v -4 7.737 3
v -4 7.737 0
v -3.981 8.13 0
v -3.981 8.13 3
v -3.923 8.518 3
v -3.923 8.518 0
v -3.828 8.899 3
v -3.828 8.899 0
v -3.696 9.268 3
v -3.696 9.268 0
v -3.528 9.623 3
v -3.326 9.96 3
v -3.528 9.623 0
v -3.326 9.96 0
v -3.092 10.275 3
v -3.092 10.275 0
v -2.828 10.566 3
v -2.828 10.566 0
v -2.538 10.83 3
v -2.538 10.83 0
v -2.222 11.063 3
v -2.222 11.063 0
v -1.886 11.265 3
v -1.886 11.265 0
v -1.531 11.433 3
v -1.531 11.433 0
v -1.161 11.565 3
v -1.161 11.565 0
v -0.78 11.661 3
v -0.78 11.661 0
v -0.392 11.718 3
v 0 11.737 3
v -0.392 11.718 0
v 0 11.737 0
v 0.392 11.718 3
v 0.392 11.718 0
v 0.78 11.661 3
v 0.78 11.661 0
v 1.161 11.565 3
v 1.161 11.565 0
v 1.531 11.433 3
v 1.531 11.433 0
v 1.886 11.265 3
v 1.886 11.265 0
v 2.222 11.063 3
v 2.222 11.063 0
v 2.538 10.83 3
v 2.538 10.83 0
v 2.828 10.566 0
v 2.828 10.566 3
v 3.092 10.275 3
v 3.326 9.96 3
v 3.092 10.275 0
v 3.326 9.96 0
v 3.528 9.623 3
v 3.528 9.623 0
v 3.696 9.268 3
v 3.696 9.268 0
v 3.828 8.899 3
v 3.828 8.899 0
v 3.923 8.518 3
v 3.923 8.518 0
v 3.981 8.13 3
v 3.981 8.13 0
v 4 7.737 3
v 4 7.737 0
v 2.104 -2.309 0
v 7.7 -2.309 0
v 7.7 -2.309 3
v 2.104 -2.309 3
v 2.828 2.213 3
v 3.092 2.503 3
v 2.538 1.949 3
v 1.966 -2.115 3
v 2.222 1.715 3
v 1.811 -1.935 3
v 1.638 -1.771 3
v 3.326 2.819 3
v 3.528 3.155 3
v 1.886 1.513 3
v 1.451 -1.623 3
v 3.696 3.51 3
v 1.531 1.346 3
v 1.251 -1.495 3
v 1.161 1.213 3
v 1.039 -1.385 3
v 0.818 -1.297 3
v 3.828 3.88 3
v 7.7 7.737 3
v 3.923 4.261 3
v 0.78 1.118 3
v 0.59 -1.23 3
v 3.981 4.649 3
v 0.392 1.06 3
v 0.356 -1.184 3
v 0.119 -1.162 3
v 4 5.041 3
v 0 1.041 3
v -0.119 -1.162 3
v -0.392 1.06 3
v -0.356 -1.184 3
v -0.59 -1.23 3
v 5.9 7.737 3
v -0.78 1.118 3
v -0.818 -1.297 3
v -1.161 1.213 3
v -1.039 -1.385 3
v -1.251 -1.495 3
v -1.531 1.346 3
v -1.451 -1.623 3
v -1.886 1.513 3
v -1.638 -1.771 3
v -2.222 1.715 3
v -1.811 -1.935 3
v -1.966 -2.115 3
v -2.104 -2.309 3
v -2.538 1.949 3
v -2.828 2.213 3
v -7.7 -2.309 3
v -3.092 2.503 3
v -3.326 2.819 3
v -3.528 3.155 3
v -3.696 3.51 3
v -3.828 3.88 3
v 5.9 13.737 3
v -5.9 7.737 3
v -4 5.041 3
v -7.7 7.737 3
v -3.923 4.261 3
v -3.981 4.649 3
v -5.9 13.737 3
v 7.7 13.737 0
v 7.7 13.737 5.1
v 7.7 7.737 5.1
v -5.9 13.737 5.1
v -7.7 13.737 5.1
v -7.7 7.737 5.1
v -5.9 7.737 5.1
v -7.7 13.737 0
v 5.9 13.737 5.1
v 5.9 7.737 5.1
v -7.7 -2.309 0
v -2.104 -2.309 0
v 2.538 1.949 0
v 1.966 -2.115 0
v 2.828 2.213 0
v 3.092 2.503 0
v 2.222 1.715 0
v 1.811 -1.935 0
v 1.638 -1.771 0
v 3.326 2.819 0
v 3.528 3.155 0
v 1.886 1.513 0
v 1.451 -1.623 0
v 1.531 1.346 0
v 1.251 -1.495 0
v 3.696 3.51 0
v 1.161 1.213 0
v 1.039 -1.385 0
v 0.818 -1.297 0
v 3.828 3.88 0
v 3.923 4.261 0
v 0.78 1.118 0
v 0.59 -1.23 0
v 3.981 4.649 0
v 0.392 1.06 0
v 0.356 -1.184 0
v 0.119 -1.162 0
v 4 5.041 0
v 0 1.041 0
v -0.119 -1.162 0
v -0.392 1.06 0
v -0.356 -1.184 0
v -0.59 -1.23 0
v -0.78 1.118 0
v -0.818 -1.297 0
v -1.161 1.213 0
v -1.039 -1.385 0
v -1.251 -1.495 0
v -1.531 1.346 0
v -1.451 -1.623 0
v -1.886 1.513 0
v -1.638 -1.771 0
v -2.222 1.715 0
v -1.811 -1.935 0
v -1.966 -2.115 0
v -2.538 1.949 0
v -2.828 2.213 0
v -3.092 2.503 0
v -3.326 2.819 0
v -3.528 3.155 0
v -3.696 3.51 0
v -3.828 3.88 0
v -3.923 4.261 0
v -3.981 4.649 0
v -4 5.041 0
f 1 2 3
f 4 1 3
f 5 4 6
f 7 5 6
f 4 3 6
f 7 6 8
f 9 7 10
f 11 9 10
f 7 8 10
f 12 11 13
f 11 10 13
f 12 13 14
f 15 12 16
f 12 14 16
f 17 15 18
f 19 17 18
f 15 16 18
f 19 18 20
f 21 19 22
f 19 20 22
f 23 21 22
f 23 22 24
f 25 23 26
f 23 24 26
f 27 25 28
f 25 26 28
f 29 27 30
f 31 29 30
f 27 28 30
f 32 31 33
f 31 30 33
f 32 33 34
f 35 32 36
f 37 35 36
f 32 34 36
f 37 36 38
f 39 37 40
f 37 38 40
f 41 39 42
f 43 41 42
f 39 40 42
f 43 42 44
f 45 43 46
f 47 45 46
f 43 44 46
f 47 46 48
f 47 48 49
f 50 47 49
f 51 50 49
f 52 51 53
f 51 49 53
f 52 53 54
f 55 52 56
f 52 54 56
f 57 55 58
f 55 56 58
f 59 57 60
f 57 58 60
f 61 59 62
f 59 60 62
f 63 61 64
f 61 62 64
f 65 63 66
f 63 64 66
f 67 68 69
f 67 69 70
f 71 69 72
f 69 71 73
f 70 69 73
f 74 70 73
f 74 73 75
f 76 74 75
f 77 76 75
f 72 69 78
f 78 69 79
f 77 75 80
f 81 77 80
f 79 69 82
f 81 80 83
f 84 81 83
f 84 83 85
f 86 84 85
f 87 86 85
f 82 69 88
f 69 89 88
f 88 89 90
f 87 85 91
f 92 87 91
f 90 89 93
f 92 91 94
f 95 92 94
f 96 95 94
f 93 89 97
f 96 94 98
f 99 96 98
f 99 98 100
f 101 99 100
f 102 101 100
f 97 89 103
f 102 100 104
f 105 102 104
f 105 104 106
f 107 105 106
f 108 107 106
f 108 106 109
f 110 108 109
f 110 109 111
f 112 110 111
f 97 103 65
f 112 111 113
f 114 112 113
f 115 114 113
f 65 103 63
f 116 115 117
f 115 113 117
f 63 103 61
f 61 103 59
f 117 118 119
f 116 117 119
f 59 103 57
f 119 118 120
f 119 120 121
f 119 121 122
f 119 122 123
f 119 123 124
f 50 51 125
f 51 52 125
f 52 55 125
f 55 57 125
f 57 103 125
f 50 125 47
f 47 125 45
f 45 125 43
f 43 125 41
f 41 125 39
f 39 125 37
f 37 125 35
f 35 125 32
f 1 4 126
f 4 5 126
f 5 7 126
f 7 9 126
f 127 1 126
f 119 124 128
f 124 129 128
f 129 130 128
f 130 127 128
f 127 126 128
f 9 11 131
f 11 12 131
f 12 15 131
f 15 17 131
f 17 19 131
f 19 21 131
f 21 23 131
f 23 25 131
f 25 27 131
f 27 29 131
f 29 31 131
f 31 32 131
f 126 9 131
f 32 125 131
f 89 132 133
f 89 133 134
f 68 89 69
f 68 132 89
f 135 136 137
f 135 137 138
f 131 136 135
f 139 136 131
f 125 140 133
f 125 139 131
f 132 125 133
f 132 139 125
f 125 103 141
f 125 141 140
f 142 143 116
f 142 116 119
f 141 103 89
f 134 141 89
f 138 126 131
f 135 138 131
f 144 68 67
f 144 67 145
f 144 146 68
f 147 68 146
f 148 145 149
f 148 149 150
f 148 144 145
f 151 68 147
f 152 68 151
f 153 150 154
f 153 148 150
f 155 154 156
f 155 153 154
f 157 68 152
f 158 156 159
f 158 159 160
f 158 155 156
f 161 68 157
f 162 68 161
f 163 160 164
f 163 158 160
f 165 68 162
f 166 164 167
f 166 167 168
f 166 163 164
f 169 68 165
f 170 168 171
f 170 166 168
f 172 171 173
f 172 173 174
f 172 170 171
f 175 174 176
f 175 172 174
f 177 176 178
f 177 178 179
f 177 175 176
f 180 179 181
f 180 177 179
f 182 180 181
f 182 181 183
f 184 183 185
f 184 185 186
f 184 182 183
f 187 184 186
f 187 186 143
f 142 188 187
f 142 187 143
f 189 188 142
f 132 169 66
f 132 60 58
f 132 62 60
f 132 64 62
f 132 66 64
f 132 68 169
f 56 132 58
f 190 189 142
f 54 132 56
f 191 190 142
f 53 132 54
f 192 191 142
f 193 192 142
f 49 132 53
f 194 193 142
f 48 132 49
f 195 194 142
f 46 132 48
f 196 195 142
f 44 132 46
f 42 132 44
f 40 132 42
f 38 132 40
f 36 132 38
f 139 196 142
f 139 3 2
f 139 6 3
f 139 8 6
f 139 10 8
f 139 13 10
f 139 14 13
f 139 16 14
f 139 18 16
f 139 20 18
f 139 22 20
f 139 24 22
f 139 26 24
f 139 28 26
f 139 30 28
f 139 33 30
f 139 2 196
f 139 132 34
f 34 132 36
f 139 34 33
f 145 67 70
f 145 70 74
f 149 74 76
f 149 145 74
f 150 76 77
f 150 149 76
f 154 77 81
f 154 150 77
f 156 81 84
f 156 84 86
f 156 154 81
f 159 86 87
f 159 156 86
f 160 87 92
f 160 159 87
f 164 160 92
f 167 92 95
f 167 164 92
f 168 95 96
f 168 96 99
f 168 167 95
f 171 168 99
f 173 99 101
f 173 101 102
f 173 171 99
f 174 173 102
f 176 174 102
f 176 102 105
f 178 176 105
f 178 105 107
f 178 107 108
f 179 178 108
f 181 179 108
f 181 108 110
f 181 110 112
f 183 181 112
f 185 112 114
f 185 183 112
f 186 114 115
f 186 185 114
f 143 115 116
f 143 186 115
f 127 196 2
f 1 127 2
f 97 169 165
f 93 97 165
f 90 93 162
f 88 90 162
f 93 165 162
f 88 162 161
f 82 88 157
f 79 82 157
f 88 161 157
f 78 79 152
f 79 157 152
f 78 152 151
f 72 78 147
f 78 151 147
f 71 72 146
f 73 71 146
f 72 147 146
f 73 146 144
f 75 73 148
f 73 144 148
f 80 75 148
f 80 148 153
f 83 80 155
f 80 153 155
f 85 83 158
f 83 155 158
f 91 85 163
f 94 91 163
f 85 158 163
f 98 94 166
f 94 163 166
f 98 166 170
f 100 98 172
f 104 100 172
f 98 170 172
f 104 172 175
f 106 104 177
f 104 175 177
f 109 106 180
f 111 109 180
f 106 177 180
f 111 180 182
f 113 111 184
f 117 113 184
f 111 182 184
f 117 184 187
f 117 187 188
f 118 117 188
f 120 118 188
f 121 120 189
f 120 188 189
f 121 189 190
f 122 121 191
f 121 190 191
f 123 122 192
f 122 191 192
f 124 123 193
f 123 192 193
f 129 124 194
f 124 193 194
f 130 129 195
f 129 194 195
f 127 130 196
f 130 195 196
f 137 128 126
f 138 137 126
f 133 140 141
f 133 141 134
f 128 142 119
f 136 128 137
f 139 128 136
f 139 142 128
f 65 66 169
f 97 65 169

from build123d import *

# Parameters (mm, degrees)
EXTRUDE_1_DEPTH = 3
SKETCH_2_W      = 1.8
SKETCH_2_H      = 6
EXTRUDE_2_DEPTH = 2.1


with BuildPart() as part:
    # Эскиз1 → Бобышка-Вытянуть1 (new body)
    with BuildSketch(Plane.XY):
        with BuildLine():
            Line((-7.7, 13.737499607), (7.7, 13.737499607))
            Line((7.7, 13.737499607), (7.7, -0.039604792))
            Line((7.7, -0.039604792), (7.7, -2.309398114))
            Line((7.7, -2.309398114), (2.10443313, -2.309398114))
            ThreePointArc((2.10443313, -2.309398114), (0, -1.158976271), (-2.10443313, -2.309398114))
            Line((-2.10443313, -2.309398114), (-7.7, -2.309398114))
            Line((-7.7, -2.309398114), (-7.7, -0.039604792))
            Line((-7.7, -0.039604792), (-7.7, 13.737499607))
        make_face()
        with BuildLine():
            Line((4, 7.737499607), (4, 5.041023729))
            ThreePointArc((4, 5.041023729), (0, 1.041023729), (-4, 5.041023729))
            Line((-4, 5.041023729), (-4, 7.737499607))
            ThreePointArc((-4, 7.737499607), (0, 11.737499607), (4, 7.737499607))
        make_face(mode=Mode.SUBTRACT)
    extrude(amount=EXTRUDE_1_DEPTH)

    # Эскиз2 → Бобышка-Вытянуть2 (add)
    with BuildSketch(Plane.XY.offset(3)):
        with Locations((-6.8, 10.737499607)):
            Rectangle(SKETCH_2_W, SKETCH_2_H)
        with Locations((6.8, 10.737499607)):
            Rectangle(SKETCH_2_W, SKETCH_2_H)
    extrude(amount=EXTRUDE_2_DEPTH)


solid = part.part
